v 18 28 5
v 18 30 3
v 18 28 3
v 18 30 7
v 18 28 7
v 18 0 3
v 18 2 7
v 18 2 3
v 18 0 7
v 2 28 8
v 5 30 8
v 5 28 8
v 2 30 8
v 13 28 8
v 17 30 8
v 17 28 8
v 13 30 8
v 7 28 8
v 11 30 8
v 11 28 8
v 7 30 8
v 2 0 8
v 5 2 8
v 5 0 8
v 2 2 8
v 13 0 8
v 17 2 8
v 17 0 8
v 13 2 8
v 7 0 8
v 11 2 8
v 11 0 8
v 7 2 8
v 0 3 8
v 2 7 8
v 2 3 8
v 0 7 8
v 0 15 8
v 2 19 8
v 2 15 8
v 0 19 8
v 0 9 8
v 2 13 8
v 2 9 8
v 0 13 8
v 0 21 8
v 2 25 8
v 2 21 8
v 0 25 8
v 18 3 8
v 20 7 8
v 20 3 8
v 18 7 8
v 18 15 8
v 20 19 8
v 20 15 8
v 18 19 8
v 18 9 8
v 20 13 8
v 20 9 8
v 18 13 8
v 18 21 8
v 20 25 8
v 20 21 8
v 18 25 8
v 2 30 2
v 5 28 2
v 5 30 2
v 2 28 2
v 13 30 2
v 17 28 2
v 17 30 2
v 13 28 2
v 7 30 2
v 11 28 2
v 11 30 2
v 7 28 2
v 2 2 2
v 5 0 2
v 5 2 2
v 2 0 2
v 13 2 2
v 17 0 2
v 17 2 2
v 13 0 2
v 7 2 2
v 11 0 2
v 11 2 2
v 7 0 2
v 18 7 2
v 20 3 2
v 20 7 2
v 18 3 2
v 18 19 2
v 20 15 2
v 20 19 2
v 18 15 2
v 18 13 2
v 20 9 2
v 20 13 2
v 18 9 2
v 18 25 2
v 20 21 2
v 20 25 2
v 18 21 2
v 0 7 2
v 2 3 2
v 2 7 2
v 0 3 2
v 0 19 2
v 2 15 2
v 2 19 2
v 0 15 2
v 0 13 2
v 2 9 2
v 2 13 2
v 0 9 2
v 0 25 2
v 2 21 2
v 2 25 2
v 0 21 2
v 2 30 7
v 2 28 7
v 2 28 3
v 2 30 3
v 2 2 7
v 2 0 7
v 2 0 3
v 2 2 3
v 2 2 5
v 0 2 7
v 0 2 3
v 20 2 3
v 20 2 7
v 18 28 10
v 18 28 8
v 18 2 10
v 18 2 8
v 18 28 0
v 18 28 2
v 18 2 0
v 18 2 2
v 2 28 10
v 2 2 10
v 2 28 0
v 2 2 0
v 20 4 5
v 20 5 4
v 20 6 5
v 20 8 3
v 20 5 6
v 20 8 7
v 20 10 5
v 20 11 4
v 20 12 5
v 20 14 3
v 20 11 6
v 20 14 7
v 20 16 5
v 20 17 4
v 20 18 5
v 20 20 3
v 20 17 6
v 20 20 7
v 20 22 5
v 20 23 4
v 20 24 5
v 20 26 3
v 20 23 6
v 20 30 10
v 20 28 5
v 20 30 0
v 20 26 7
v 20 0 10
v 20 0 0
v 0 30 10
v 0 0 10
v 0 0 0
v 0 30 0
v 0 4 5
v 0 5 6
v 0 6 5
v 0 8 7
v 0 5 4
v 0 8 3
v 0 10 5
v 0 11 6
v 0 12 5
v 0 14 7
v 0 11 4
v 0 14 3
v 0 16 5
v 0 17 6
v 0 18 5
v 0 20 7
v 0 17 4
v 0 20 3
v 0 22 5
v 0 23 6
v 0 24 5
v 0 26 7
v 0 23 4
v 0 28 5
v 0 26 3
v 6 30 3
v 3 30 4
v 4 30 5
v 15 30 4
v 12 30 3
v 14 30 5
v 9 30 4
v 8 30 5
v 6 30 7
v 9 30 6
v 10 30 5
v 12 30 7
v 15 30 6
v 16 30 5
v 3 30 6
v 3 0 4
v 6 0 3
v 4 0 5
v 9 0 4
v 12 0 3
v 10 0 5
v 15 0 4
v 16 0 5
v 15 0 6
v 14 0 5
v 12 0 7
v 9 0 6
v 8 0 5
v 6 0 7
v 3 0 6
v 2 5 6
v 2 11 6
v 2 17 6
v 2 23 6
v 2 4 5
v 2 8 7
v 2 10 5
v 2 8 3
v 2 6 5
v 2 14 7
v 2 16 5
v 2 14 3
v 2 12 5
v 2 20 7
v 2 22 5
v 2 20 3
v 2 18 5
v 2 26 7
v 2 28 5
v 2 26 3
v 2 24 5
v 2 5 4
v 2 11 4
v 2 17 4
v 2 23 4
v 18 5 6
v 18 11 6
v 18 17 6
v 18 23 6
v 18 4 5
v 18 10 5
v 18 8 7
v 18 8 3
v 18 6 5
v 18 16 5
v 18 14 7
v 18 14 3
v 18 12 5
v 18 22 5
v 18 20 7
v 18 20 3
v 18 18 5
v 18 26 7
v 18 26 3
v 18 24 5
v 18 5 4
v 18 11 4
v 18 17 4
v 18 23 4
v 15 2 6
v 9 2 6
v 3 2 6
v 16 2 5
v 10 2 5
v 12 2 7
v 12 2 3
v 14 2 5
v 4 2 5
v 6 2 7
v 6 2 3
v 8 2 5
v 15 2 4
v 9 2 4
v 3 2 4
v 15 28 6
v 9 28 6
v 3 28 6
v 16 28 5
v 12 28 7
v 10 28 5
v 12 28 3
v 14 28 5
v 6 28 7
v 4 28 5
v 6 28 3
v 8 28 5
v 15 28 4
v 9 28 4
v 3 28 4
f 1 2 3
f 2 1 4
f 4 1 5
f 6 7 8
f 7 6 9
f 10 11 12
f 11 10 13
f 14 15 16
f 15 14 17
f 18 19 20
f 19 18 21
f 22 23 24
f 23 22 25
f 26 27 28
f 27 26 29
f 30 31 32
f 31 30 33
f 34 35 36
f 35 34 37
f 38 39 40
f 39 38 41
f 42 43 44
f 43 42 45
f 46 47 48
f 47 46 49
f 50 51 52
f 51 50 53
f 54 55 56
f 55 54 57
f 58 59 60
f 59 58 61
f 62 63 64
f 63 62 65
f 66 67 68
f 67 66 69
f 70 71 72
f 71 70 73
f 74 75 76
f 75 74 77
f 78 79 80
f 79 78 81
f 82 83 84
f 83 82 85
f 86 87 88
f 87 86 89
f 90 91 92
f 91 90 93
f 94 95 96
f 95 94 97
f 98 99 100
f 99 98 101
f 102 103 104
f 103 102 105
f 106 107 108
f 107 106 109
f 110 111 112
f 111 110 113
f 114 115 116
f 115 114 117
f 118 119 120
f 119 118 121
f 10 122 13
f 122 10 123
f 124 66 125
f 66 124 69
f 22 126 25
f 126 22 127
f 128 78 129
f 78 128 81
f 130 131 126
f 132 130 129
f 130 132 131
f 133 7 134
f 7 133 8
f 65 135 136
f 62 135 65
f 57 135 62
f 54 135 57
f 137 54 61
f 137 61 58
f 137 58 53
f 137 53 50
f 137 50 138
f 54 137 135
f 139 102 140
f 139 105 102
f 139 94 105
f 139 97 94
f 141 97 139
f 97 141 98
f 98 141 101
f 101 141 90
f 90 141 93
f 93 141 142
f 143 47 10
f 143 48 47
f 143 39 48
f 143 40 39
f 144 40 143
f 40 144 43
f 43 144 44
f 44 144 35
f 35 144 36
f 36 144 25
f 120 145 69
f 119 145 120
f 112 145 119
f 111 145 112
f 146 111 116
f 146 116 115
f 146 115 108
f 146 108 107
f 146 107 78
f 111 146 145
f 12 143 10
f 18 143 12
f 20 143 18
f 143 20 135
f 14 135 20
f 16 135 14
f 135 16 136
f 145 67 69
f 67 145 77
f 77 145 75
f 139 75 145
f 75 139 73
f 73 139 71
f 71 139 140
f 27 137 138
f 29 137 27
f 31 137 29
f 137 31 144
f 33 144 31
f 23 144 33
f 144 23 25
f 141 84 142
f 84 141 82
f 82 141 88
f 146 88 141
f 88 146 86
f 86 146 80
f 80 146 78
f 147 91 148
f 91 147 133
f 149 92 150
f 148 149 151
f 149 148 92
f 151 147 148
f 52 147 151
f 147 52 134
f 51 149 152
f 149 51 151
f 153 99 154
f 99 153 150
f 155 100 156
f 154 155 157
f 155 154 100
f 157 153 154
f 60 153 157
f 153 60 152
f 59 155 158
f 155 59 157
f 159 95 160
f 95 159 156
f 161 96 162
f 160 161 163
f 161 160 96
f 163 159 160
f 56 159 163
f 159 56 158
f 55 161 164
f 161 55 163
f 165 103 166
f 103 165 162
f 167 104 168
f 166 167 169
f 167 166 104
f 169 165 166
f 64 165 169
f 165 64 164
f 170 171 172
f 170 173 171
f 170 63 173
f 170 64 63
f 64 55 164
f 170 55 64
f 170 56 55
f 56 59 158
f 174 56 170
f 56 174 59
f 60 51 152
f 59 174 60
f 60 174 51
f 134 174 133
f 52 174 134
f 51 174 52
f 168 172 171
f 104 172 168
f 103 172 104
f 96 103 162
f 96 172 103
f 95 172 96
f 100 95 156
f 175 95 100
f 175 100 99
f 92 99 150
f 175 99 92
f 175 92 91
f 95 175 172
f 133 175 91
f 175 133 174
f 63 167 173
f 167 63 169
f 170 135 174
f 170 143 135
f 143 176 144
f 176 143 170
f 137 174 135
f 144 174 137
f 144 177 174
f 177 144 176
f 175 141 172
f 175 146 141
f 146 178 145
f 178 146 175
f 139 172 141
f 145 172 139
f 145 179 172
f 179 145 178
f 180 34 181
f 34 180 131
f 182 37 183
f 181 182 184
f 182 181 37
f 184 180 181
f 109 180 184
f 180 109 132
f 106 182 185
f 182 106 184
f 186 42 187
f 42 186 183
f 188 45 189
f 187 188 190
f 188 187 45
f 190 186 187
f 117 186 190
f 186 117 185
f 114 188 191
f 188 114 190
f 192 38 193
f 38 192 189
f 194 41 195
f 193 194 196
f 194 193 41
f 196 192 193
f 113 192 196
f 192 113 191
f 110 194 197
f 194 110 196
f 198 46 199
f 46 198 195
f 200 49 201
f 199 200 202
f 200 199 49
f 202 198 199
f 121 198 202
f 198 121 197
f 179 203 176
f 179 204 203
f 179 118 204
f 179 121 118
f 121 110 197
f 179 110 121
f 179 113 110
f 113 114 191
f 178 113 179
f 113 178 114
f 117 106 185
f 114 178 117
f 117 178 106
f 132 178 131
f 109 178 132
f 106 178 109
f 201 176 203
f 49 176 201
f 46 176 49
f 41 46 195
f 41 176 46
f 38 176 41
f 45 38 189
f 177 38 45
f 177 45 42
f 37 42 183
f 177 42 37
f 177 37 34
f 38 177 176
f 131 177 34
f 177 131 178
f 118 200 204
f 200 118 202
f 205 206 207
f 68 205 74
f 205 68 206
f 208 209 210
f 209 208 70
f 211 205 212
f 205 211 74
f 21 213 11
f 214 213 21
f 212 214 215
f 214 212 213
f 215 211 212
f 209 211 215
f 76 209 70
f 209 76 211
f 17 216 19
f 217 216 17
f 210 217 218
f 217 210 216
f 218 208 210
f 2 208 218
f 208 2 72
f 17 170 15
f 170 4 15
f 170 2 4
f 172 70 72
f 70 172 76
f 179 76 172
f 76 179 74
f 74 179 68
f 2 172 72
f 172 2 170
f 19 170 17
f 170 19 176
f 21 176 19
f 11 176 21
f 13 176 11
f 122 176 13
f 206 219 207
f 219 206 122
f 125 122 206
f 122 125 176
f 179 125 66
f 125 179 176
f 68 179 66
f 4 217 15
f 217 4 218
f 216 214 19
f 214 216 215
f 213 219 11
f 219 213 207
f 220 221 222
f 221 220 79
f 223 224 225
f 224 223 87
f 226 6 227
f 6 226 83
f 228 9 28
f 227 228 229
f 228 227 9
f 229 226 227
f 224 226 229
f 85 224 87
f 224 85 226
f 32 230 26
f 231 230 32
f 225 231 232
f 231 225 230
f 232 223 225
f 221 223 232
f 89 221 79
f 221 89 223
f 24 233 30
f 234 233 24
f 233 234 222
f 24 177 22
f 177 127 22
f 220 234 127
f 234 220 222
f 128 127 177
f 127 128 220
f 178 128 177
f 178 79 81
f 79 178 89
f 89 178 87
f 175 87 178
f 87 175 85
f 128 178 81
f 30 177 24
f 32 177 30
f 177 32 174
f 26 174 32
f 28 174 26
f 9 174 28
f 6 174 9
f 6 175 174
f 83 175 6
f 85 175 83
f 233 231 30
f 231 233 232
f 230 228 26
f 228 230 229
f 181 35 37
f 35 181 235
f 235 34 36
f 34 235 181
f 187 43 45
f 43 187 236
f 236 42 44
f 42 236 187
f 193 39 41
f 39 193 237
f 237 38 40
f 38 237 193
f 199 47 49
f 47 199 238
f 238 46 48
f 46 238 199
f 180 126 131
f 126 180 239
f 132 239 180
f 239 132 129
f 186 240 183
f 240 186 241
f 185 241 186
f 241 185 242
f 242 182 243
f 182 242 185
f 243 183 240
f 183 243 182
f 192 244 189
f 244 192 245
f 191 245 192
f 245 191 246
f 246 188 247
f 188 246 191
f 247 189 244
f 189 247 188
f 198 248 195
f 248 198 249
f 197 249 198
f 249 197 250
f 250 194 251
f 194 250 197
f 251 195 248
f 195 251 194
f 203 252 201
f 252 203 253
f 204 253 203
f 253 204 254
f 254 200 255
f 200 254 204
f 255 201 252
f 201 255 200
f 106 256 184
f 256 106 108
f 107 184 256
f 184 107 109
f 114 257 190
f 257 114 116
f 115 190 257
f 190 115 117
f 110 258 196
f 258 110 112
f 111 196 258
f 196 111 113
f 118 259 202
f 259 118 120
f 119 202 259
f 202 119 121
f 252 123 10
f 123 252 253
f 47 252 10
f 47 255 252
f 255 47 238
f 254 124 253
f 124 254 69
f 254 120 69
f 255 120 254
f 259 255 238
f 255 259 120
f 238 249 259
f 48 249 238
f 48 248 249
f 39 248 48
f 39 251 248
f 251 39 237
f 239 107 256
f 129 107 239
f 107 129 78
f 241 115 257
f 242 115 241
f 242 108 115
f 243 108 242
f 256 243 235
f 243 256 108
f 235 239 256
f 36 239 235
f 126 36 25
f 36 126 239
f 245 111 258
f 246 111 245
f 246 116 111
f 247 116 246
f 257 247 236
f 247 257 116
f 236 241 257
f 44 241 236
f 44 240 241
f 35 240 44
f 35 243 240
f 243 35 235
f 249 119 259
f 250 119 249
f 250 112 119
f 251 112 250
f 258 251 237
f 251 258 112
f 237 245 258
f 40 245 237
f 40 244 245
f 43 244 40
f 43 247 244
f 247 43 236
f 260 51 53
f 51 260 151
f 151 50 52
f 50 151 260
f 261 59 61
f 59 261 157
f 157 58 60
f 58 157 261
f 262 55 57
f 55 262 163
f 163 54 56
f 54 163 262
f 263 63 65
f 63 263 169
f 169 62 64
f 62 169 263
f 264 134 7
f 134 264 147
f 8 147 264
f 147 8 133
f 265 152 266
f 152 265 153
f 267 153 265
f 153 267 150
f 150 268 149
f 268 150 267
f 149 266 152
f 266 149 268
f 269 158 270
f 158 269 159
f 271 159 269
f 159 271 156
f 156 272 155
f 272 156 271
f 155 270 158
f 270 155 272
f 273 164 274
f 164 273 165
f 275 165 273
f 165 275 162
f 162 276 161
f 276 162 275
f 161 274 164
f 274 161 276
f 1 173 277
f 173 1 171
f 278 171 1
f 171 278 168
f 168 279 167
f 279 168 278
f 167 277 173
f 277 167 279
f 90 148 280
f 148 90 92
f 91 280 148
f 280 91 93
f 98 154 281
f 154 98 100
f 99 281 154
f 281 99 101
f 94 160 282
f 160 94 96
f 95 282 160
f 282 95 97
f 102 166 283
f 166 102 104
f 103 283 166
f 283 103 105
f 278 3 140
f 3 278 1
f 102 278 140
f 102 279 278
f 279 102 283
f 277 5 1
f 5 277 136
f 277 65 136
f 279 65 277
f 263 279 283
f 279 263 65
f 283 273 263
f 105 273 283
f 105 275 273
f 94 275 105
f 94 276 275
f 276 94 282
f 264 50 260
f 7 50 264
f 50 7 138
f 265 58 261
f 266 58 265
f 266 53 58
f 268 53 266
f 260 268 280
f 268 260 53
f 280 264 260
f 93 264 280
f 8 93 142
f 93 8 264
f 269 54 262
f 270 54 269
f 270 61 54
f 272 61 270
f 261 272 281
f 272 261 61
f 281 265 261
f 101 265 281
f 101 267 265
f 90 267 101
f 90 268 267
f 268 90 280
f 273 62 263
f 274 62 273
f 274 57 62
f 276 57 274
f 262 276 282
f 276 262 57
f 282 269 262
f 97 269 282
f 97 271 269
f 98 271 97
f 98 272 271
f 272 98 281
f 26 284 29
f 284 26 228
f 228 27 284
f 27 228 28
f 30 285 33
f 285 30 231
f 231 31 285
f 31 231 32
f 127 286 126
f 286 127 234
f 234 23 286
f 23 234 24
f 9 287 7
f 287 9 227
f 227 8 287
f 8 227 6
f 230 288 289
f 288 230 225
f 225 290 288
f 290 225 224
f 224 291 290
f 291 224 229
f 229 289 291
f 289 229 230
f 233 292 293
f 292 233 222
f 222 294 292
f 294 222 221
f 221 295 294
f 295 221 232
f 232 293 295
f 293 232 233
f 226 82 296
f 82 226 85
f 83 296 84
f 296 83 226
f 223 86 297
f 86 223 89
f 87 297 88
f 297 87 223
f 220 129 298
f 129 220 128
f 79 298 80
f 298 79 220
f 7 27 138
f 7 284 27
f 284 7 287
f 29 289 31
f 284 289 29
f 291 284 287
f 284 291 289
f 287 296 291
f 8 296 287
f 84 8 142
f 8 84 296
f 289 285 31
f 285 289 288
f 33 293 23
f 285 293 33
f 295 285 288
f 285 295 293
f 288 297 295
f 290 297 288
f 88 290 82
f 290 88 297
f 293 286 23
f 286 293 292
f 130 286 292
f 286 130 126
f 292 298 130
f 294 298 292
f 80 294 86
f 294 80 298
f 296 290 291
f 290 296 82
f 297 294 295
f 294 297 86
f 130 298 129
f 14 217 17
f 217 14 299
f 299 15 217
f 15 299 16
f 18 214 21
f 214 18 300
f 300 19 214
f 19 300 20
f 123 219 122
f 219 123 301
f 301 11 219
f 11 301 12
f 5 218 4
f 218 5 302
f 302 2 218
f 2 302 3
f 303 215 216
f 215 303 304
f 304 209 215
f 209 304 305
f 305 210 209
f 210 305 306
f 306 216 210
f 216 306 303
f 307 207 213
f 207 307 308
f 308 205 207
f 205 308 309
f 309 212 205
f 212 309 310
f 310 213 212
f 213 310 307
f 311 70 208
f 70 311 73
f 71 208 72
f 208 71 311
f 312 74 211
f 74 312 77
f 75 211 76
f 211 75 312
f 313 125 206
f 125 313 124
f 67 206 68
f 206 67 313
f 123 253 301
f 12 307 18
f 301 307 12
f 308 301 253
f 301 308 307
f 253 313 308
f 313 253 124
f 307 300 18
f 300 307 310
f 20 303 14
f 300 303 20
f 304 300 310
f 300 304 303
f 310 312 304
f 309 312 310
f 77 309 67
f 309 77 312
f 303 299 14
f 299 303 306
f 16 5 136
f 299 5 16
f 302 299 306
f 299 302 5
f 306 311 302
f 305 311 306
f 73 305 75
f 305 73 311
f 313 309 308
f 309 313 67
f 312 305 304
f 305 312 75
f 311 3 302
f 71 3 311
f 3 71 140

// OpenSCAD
module box_with_beams(size, wall=4) {
  inner_size = size - [wall, wall, wall]*2;
  center = (size - inner_size)/2;
  size_helf = size/2;
  
  difference()
  {
    cube(size);
    translate(center)
    {
      // now 'extrude' each side
      // Y extrude
      translate([0, -size_helf.y, 0])
      cube(inner_size + [0, size.y, 0]);

      // X extrude
      translate([-size_helf.x, 0, 0])
      cube(inner_size + [size.x, 0, 0]);
    
      // Z extrude
      translate([0, 0, -size_helf.z])
      cube(inner_size + [0, 0, size.x]);
    }
  }
  
  // 'beams' 2.0
  // plane with 'cutouts'
  module beams_v2(beam_size) {
    module hole_v2() {
      color("pink")
      //translate([0, wall*2.5, wall*1])
      rotate([0, 00, 0])
      cylinder(h = 100, r = wall, $fn=4);
    }
    
    difference()
    {
      color("black")
      cube(beam_size);
      xi = ceil(((beam_size.x - wall*2.5)*2)/wall*3);
      xj = ceil(beam_size.y / wall)/2 + 1;
      echo(beam_size=beam_size, xi=xi, xj=xj);
     
  // 2nd row translate([0, wall*1, wall*2.5]) N mod 2 != 0
  // 1st row translate([0, wall*2.5, wall*1]) N mod 2 == 0
      translate(-[beam_size.z, beam_size.z])
      for (i = [0:xi]) {
        for (j = [0:2:xj]) {
          translate([wall + i*wall*3, wall*2.5 + j/2*wall*3,-1])
          hole_v2();
        }
        for (j = [-1:2:xj]) {
          translate([wall*2.5, wall*2.5 + j/2*wall*3, -1])
          hole_v2();
        }
      }
    }
}

translate([0, wall, wall + inner_size.z])
rotate([0, 90, 0])
beams_v2([inner_size.z, inner_size.y, wall]);


translate([inner_size.x + wall, wall, wall + inner_size.z])
rotate([0, 90, 0])
beams_v2([inner_size.z, inner_size.y, wall]);


translate([center.x + inner_size.x, 0, wall + inner_size.z])
rotate([0, 90, 90])
beams_v2([inner_size.z, inner_size.x, wall]);

translate([center.x + inner_size.x, inner_size.y + wall, wall + inner_size.z])
rotate([0, 90, 90])
beams_v2([inner_size.z, inner_size.x, wall]);

  // add 'beams'
  module beam() {
  rotate([45, 0, 0])
  cube([wall, wall, size.z]);
  }
  if (0)
  {
  translate([0, 8, 0.5]) {
  beam();
  translate([0, 6, 0])
  beam();
  }
  translate([0, 8, 0.5]) 
  mirror([0, 1, 0])
  {
  beam();
  translate([0, 6, 0])
  beam();
  }
  }
  
  // due to openscad footery thi has to be last
    // bounding box
  //color("gray", 0.3) cube(size);
}

box_with_beams([20, 30, 10], wall=2);
